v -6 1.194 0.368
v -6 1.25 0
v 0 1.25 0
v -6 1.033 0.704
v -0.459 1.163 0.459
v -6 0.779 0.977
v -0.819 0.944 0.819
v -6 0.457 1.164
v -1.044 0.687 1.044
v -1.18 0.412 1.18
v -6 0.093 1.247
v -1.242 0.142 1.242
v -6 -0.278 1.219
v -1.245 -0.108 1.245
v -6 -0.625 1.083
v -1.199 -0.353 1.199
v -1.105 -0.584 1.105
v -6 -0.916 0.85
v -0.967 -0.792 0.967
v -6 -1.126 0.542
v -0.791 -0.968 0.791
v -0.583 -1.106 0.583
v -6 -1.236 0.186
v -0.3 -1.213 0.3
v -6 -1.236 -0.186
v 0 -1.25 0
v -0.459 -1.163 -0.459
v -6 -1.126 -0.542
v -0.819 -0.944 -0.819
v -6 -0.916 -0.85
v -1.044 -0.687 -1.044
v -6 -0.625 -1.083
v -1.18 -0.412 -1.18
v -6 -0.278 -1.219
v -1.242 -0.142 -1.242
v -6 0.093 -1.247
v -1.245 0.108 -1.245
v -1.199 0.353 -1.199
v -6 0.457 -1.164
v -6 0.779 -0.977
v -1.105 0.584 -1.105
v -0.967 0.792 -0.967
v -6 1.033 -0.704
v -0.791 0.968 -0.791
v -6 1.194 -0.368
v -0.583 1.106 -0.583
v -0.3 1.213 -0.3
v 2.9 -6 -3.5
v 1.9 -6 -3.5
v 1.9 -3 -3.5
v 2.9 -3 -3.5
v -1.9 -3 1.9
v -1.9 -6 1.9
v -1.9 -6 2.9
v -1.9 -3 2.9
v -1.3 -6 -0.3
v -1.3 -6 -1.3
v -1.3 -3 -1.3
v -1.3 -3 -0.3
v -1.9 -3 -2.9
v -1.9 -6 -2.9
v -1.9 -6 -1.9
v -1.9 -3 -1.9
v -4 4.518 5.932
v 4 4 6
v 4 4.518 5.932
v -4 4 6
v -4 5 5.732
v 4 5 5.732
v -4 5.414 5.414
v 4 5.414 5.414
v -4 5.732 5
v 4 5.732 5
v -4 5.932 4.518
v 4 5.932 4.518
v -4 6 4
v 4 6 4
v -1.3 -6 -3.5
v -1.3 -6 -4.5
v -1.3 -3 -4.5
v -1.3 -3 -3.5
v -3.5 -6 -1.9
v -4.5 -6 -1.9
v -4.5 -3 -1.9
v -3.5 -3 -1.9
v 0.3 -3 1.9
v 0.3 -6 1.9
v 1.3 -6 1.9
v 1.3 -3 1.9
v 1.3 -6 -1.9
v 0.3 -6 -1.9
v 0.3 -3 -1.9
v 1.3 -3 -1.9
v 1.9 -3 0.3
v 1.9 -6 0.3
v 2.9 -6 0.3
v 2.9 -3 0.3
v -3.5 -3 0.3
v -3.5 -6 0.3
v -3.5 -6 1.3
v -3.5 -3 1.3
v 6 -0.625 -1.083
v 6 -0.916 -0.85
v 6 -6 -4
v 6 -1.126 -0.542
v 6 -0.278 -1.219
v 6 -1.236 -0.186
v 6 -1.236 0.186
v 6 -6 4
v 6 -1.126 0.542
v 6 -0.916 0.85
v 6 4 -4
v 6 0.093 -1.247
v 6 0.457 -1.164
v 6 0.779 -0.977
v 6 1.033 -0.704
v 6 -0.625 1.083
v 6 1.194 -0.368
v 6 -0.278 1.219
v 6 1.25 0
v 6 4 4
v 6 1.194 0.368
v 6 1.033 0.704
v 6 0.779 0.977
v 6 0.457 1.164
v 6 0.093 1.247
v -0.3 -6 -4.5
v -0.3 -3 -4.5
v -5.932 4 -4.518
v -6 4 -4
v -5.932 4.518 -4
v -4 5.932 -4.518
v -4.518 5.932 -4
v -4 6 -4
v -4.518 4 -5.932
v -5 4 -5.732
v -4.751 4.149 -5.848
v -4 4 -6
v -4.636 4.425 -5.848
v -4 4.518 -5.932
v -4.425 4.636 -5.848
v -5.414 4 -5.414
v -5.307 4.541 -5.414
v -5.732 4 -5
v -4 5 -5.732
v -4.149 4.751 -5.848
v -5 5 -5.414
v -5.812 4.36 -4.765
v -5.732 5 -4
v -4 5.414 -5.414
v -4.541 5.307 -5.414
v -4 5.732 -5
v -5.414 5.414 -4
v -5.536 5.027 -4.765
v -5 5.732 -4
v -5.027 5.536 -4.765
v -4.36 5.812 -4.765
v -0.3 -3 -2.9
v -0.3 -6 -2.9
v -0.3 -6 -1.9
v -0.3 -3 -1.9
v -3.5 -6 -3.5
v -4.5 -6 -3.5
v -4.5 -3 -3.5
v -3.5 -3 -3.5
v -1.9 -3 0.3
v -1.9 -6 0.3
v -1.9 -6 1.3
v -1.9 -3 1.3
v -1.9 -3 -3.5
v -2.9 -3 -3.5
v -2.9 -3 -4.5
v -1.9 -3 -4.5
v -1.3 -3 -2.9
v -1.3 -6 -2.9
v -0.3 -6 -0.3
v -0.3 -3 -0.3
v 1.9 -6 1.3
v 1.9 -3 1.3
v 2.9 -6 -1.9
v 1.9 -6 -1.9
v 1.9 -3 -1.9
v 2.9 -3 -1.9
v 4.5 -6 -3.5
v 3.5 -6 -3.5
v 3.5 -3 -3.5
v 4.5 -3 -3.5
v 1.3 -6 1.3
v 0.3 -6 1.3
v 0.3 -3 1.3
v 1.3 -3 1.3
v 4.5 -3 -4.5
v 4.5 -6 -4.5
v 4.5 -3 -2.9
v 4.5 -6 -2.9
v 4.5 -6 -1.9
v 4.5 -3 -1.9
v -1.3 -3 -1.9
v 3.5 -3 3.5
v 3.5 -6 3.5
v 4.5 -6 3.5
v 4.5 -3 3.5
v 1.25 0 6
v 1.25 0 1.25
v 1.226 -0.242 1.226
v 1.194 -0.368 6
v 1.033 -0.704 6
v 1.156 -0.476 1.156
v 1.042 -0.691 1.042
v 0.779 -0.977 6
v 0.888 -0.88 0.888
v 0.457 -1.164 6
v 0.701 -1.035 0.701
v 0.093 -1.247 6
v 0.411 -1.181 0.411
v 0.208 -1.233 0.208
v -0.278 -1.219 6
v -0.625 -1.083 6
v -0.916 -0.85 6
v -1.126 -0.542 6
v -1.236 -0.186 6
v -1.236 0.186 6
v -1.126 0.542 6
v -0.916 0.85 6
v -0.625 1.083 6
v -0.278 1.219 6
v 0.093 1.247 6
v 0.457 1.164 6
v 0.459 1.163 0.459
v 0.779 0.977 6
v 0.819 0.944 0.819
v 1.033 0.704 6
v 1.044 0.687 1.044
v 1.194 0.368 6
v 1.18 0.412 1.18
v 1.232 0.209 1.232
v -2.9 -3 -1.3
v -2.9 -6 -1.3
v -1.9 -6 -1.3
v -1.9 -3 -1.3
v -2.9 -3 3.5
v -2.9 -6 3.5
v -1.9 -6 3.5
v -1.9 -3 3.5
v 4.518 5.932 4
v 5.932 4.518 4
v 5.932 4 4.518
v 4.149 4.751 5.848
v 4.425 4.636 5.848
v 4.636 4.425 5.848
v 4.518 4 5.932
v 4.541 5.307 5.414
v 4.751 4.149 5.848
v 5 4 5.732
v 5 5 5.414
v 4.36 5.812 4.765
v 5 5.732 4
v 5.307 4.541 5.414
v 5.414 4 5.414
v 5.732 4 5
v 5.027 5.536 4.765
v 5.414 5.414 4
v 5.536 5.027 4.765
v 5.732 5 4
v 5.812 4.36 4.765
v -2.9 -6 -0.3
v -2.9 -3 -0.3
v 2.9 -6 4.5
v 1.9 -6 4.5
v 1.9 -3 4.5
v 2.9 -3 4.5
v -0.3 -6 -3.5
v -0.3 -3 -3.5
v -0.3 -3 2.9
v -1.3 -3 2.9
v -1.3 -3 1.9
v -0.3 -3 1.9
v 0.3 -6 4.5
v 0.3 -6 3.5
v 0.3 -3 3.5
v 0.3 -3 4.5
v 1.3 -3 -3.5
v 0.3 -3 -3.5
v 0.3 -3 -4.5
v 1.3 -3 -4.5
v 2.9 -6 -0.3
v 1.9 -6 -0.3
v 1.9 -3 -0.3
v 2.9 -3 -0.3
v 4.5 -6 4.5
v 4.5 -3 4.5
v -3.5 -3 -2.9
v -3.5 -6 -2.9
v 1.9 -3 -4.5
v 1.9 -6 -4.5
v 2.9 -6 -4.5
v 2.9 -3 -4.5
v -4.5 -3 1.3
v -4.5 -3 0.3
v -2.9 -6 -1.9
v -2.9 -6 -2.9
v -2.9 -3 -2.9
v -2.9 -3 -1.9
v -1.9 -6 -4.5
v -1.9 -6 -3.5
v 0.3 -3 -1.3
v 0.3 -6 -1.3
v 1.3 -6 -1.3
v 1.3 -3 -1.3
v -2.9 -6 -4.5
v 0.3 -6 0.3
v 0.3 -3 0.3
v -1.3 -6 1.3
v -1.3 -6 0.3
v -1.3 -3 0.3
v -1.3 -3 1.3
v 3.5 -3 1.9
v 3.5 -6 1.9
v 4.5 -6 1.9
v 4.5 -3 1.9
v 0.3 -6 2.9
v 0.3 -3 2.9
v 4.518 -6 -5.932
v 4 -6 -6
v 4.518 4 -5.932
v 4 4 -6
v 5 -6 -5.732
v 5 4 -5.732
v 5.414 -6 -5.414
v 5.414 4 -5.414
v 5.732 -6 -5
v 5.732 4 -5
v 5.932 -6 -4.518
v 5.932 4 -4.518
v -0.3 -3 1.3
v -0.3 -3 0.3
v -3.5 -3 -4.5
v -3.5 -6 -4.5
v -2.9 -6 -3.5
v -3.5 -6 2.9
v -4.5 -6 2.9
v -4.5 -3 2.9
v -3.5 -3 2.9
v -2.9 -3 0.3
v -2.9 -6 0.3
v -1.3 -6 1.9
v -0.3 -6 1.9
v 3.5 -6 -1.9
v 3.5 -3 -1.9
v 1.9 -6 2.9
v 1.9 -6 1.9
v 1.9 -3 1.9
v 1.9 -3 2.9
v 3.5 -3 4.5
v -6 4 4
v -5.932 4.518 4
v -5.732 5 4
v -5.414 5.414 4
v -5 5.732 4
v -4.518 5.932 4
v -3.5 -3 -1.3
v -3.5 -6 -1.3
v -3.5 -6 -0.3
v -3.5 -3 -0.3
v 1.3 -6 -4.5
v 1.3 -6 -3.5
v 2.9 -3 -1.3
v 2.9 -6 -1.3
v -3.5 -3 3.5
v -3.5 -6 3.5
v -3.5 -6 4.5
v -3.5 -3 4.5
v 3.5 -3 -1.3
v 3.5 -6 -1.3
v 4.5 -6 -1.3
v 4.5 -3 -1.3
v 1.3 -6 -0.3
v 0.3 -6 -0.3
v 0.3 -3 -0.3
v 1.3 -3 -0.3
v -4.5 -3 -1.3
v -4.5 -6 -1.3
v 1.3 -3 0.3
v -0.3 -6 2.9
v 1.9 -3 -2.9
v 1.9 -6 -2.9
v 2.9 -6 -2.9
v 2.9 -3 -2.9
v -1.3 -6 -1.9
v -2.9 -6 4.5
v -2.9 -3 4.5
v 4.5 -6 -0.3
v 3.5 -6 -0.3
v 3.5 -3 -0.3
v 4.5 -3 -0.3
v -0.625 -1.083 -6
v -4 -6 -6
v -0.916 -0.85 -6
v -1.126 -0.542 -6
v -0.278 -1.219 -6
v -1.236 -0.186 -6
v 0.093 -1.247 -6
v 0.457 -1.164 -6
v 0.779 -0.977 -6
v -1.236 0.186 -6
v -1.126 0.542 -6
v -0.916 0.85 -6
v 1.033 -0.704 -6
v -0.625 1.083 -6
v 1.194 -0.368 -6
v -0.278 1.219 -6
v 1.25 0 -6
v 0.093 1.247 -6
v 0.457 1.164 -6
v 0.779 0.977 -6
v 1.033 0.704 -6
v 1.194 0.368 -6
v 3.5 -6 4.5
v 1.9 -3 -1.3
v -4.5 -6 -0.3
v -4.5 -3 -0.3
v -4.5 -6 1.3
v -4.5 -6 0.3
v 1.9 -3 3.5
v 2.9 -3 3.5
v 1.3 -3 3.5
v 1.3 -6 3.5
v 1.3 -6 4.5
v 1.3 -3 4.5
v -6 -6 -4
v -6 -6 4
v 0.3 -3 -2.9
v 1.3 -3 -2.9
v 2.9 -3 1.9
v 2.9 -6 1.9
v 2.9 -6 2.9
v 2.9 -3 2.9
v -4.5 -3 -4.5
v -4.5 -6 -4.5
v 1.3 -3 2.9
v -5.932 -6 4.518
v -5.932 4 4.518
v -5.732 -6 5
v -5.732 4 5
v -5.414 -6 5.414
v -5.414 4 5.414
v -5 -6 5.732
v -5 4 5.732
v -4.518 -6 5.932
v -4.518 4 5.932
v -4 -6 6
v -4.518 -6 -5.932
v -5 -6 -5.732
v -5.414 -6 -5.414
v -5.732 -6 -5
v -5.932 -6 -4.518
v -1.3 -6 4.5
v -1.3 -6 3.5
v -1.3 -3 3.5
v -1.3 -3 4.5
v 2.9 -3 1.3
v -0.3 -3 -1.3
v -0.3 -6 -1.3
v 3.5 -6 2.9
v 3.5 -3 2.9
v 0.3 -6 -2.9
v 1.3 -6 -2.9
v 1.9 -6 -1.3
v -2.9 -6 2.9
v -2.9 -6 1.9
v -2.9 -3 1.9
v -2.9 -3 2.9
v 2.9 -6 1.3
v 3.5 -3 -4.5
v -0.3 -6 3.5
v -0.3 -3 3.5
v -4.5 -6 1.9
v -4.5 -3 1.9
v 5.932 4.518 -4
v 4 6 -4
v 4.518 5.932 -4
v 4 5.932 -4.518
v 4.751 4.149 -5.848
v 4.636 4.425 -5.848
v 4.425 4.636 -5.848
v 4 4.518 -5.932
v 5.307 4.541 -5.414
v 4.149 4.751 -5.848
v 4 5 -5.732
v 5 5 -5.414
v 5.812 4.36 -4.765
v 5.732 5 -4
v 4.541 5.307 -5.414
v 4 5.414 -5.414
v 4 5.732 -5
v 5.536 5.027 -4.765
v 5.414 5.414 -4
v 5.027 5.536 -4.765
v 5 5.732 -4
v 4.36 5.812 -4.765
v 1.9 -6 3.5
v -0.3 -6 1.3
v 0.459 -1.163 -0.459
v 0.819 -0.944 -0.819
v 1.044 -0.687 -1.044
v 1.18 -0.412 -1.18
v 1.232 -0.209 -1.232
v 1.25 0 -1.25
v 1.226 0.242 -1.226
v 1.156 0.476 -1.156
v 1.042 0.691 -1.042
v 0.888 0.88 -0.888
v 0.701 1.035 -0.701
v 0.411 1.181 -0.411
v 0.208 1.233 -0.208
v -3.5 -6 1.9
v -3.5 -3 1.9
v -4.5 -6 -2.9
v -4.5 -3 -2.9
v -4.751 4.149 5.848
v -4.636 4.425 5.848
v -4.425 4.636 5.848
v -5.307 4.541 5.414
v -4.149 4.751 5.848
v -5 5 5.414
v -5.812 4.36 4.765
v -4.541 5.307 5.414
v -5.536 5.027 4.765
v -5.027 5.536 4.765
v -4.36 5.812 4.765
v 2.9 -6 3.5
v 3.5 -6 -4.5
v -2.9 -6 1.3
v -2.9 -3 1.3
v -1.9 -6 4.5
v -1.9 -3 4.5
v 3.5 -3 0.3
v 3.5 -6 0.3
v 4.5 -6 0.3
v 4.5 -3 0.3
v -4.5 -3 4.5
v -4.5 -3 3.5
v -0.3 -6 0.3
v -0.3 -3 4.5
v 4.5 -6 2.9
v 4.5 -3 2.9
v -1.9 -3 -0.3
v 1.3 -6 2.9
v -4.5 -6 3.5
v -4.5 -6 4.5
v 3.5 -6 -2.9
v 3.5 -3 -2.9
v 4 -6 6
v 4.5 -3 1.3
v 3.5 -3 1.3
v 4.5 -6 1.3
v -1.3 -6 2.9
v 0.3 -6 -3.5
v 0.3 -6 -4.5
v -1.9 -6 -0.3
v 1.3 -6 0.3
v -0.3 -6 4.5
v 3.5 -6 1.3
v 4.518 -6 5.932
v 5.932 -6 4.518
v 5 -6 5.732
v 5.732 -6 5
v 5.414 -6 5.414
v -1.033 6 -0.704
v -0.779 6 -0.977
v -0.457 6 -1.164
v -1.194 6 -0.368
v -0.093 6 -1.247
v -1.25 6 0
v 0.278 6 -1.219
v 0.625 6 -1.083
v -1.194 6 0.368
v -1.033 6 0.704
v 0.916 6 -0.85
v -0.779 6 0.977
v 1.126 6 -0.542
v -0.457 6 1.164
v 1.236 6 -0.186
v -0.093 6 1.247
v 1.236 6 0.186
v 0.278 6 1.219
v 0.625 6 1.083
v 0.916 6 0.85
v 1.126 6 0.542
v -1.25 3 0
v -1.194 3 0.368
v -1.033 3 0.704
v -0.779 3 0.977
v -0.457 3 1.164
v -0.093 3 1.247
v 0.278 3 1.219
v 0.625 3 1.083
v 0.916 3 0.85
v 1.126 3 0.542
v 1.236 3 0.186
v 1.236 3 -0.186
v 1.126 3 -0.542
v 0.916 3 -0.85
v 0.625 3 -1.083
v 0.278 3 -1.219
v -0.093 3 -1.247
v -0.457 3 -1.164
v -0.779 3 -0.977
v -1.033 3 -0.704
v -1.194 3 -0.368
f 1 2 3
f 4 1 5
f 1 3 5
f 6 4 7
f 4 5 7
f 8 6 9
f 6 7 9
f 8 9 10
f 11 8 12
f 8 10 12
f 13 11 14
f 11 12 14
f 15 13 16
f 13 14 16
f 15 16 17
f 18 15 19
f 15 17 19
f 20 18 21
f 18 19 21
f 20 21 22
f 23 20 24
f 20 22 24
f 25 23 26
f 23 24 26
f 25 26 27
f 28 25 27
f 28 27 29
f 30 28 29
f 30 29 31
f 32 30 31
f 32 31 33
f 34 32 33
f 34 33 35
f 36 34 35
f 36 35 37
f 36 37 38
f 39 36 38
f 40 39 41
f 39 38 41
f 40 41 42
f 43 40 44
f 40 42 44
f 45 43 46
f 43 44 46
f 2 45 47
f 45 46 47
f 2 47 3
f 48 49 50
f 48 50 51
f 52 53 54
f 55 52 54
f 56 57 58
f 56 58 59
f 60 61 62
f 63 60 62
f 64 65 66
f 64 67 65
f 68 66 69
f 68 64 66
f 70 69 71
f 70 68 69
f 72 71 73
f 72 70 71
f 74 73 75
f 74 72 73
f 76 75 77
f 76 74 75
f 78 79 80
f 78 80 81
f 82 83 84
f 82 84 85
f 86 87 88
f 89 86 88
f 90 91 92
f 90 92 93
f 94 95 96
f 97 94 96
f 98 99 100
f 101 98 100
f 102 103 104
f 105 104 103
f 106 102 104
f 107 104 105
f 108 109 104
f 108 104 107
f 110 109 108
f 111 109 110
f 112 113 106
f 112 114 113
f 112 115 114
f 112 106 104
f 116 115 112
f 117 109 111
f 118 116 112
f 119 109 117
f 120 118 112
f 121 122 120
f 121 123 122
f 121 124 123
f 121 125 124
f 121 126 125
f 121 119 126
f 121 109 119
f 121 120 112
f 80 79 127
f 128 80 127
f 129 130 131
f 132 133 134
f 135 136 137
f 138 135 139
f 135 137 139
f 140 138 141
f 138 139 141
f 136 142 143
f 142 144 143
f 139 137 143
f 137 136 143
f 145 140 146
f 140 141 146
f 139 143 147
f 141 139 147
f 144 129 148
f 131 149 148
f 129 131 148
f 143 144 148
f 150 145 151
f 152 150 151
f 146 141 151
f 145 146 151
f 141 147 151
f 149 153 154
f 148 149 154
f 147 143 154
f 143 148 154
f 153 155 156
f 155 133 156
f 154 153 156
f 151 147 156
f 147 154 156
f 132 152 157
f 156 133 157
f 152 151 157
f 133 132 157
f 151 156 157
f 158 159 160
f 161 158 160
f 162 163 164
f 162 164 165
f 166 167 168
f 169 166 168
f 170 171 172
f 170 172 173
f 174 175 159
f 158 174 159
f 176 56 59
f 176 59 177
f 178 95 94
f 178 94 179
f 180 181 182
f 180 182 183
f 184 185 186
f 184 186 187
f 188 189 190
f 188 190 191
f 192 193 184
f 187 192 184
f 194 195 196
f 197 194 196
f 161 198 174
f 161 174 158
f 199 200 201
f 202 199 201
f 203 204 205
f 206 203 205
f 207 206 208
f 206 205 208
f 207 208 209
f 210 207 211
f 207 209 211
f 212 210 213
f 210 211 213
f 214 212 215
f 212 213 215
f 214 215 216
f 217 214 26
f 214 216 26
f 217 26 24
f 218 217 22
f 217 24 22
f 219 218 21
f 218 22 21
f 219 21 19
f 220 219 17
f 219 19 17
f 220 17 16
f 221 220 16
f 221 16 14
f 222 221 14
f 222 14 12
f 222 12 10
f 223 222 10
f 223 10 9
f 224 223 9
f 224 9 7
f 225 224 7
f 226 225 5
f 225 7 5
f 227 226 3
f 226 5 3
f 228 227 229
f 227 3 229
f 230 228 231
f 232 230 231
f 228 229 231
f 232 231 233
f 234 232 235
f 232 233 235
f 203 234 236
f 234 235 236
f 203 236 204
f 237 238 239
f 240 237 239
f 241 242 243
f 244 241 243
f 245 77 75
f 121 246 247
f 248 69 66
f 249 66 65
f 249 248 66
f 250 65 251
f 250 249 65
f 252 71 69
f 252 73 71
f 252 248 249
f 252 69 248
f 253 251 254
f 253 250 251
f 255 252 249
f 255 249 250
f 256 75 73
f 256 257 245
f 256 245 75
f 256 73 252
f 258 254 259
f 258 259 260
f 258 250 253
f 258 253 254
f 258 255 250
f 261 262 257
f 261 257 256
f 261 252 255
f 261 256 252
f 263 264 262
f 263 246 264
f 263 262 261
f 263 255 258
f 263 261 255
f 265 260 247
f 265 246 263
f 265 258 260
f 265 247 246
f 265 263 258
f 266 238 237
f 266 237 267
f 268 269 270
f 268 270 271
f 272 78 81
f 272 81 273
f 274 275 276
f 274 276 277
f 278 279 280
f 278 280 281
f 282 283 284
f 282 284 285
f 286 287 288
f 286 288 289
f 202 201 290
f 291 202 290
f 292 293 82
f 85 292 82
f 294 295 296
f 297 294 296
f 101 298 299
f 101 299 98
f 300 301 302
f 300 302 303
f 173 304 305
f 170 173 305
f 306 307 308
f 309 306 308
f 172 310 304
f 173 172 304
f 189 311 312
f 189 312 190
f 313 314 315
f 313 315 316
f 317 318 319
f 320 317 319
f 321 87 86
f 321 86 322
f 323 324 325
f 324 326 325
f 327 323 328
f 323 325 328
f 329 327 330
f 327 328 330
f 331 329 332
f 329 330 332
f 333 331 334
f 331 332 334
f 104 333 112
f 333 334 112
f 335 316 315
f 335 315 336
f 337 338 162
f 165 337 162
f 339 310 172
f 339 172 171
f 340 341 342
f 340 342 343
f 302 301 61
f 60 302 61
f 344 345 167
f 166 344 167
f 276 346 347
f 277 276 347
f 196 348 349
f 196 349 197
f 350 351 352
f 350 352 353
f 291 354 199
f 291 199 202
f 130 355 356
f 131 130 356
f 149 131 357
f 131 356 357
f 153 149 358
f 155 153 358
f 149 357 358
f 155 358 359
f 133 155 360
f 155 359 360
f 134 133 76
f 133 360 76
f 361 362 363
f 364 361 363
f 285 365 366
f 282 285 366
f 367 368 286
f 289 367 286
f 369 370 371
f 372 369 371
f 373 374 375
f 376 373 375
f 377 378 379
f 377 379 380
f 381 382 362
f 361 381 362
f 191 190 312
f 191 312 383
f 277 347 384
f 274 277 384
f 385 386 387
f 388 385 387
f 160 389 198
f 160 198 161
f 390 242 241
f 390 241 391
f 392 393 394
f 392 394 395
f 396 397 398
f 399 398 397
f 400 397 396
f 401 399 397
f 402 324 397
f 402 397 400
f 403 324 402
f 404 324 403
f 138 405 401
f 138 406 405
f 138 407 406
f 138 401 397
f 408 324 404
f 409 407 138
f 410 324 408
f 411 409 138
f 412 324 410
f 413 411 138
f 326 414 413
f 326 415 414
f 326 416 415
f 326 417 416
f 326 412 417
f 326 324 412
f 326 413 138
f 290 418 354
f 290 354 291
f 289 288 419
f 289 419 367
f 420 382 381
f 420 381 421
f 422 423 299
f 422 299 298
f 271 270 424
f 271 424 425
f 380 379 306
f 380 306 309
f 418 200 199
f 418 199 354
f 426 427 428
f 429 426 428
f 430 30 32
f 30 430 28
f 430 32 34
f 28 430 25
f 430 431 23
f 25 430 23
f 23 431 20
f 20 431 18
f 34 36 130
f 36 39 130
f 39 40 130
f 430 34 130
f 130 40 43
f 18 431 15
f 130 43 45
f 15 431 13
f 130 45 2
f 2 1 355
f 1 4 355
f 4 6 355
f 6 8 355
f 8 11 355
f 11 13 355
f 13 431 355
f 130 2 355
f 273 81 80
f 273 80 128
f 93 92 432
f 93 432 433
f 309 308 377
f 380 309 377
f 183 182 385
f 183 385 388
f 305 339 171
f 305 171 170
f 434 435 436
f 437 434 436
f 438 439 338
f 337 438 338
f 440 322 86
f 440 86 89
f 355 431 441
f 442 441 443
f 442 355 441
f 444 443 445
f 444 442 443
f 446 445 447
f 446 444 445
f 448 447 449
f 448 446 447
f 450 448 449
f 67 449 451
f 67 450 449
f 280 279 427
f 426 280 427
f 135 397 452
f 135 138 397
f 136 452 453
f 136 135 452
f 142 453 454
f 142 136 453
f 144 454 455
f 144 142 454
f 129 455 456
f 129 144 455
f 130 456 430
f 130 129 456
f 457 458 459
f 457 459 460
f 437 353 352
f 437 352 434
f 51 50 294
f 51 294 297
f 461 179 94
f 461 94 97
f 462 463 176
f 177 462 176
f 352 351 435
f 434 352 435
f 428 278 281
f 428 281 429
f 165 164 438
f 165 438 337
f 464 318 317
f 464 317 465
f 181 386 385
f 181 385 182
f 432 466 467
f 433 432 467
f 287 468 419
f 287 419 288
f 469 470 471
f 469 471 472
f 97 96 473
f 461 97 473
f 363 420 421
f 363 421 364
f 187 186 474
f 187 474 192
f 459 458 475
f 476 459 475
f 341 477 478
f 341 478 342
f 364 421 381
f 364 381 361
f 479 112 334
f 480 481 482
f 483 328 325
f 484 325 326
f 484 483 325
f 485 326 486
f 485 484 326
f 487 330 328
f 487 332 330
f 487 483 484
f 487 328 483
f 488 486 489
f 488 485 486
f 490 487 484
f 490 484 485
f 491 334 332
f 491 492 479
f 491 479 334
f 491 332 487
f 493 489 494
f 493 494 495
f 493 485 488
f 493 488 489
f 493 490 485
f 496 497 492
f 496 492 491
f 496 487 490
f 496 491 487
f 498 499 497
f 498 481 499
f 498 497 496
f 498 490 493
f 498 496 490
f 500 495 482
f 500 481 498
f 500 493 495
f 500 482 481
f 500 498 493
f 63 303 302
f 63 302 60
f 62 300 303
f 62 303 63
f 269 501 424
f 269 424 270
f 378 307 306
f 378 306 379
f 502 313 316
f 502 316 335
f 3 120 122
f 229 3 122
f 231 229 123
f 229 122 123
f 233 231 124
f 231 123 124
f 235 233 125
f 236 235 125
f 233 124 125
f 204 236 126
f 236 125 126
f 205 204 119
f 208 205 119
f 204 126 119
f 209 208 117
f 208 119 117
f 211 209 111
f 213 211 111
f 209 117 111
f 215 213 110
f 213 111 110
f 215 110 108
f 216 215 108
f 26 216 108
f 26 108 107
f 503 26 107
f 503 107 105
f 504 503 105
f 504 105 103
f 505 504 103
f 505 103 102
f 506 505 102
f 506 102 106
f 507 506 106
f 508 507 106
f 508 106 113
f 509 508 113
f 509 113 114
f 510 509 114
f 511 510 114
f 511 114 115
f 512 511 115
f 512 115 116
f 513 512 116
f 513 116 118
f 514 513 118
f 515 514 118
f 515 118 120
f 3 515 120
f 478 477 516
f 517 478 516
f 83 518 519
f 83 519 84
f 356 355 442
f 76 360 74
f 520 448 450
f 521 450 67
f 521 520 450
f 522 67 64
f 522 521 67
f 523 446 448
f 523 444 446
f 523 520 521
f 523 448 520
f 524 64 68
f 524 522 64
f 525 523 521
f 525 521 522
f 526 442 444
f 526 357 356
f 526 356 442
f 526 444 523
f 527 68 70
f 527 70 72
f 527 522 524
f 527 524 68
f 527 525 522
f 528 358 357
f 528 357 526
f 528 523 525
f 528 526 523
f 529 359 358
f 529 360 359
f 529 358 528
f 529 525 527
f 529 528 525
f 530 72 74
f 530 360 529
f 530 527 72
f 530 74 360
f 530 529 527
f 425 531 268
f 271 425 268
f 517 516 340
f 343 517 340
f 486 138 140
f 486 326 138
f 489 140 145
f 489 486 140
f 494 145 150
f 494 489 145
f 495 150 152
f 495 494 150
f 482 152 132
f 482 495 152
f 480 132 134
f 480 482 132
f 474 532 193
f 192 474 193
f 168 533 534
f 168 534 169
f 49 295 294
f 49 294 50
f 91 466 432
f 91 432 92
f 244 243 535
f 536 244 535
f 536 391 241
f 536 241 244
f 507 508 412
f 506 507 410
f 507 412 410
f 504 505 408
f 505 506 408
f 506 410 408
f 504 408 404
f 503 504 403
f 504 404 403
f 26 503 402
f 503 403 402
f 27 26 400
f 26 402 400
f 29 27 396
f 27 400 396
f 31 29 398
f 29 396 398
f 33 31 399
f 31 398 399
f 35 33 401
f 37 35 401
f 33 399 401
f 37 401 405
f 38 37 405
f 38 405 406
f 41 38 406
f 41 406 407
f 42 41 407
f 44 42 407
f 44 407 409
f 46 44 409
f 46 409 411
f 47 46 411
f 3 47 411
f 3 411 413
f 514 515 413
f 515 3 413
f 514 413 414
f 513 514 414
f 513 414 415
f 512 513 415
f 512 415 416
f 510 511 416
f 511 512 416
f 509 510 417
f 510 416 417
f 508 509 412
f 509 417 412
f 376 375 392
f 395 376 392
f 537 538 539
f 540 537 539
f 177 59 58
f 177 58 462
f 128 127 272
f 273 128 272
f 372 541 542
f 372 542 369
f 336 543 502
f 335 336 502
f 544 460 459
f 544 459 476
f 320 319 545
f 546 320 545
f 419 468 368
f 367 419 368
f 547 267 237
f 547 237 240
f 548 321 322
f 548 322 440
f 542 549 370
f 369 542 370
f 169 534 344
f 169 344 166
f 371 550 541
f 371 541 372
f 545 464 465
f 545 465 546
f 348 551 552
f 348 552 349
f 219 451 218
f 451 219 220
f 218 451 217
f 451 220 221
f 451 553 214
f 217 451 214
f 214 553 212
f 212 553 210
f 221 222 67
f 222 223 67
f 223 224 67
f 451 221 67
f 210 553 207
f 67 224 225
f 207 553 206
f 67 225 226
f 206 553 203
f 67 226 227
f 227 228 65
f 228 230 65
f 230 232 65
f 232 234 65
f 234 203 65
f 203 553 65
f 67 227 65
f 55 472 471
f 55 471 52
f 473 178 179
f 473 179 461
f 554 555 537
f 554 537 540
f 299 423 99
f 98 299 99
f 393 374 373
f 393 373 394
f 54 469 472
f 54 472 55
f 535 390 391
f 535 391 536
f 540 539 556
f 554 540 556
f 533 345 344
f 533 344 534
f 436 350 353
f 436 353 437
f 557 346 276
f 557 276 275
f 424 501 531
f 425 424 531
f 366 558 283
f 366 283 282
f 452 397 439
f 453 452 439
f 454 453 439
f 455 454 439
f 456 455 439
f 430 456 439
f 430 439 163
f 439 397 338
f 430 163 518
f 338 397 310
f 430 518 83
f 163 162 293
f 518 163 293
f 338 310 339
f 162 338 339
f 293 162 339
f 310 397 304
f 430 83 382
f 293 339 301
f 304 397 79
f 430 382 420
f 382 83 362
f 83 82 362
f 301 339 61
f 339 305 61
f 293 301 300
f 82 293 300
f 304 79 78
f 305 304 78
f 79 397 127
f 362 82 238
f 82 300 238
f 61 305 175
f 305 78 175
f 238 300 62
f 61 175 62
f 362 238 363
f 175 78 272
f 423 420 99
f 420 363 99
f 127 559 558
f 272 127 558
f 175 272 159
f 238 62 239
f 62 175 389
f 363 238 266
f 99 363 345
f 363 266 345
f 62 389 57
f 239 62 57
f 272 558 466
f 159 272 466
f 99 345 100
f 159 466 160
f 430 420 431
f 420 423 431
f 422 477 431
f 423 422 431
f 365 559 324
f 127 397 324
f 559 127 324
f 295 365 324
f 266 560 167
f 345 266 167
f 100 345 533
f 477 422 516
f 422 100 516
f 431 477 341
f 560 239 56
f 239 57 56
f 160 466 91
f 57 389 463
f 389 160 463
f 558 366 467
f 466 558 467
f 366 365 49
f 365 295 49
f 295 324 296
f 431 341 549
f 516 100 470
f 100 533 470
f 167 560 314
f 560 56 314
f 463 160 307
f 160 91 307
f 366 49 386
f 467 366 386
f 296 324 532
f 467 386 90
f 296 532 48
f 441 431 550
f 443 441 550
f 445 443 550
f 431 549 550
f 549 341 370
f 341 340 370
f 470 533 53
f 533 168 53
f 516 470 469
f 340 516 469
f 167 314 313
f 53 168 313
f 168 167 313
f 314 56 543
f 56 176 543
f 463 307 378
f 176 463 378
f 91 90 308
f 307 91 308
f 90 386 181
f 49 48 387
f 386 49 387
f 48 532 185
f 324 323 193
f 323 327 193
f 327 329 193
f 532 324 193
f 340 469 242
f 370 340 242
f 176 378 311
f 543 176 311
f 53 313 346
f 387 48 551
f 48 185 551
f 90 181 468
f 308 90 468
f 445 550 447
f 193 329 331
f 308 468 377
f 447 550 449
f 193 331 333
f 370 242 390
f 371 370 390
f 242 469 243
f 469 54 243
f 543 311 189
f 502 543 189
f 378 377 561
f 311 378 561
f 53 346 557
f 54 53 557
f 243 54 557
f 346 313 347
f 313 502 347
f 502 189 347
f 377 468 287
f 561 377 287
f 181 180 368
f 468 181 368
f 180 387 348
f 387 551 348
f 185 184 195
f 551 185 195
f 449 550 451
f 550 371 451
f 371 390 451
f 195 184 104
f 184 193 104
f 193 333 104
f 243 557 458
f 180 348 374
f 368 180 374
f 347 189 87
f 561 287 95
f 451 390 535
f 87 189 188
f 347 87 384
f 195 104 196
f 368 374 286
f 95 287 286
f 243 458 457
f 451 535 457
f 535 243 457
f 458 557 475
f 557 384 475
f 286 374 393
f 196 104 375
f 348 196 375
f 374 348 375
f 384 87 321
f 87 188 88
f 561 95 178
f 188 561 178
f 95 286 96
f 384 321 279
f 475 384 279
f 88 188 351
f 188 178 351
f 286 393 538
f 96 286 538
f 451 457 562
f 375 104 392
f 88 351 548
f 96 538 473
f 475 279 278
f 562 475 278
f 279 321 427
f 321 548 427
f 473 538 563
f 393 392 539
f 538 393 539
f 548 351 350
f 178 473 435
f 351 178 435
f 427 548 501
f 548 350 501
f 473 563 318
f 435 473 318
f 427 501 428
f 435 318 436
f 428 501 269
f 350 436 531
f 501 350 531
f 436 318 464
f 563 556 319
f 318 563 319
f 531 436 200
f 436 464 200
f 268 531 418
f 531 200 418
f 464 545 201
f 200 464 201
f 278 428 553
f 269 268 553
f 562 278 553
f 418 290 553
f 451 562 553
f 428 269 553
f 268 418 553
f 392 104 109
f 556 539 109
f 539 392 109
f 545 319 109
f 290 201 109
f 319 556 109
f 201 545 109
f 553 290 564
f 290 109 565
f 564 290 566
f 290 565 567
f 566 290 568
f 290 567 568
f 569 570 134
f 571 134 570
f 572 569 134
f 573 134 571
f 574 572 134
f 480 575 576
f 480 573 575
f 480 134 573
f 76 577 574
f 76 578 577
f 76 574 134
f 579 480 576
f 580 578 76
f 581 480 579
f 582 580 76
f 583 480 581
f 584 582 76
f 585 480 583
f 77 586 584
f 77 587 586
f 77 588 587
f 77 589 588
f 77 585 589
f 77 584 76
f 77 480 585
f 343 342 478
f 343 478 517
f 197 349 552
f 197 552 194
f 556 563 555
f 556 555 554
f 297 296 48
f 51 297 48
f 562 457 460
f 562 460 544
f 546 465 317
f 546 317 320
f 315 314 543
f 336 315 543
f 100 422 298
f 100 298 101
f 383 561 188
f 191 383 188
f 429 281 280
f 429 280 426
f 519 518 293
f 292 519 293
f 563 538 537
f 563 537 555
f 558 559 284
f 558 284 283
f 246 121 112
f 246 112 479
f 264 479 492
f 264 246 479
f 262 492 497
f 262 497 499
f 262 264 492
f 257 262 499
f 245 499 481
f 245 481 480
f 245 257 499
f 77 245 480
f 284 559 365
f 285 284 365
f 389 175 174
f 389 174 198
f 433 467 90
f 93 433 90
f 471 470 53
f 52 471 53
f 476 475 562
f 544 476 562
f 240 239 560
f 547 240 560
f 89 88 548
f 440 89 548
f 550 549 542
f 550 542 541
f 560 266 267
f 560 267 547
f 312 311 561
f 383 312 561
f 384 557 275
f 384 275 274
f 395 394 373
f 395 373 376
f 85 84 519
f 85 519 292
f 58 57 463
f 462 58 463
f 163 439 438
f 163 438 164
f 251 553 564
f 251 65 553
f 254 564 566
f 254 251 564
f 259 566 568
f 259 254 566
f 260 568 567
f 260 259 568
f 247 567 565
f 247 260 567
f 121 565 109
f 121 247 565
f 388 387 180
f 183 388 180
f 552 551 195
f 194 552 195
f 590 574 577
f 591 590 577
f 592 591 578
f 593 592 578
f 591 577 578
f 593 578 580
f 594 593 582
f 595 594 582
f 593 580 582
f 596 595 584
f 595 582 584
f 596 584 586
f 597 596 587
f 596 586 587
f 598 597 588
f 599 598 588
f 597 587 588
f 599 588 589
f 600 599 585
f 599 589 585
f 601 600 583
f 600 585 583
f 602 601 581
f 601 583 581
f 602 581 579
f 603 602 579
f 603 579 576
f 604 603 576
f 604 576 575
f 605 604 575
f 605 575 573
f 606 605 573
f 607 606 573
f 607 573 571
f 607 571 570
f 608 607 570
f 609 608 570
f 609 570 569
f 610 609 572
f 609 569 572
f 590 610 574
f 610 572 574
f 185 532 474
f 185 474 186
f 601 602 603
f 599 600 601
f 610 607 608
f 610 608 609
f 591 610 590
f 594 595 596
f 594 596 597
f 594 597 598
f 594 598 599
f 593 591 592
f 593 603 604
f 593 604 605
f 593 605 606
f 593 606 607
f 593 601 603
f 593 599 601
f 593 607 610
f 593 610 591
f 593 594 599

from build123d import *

# Parameters (mm, degrees)
F0_W      = 12
F0_H      = 12
F1_DEPTH  = 6
F2_R      = 1.25
F3_DEPTH  = 12.001
F4_R      = 1.25
F5_DEPTH  = 3
F6_R      = 1.25
F7_DEPTH  = 25
F8_R      = 2
F9_W      = 1
F9_H      = 1
F10_DEPTH = 3


with BuildPart() as f1:
    # F0 (on Right) → F1 (new body, symmetric)
    with BuildSketch(Plane.YZ):
        Rectangle(F0_W, F0_H)
    extrude(amount=F1_DEPTH, both=True)

    # F2 (on face) → F3 (cut, through all)
    with BuildSketch(Plane.YZ.offset(6)):
        Circle(F2_R)
    extrude(amount=-F3_DEPTH, mode=Mode.SUBTRACT)

    # F4 (on face) → F5 (cut)
    with BuildSketch(Plane(origin=(0, 6, 0), x_dir=(-1, 0, 0), z_dir=(0, 1, 0))):
        Circle(F4_R)
    extrude(amount=-F5_DEPTH, mode=Mode.SUBTRACT)

    # F6 (on face) → F7 (cut)
    with BuildSketch(Plane(origin=(0, 0, -6), x_dir=(1, 0, 0), z_dir=(0, 0, -1))):
        Circle(F6_R)
    extrude(amount=-F7_DEPTH, mode=Mode.SUBTRACT)

    # F8
    f8_edges = [f1.edges().sort_by_distance(p)[0] for p in [
        (6, 6, 0),
        (-6, 6, 0),
        (-6, 0, -6),
        (6, 0, -6),
        (0, 6, -6),
        (-6, 0, 6),
        (0, 6, 6),
        (6, 0, 6),
    ]]
    fillet(f8_edges, radius=F8_R)

    # F9 (on face) → F10 (cut)
    with BuildSketch(Plane.XZ.offset(6)):
        with Locations((-4, 4)):
            Rectangle(F9_W, F9_H)
        with Locations((-4, 2.4)):
            Rectangle(F9_W, F9_H)
        with Locations((-4, 0.8)):
            Rectangle(F9_W, F9_H)
        with Locations((-4, -0.8)):
            Rectangle(F9_W, F9_H)
        with Locations((-4, -2.4)):
            Rectangle(F9_W, F9_H)
        with Locations((-4, -4)):
            Rectangle(F9_W, F9_H)
        with Locations((-2.4, 4)):
            Rectangle(F9_W, F9_H)
        with Locations((-2.4, 2.4)):
            Rectangle(F9_W, F9_H)
        with Locations((-2.4, 0.8)):
            Rectangle(F9_W, F9_H)
        with Locations((-2.4, -0.8)):
            Rectangle(F9_W, F9_H)
        with Locations((-2.4, -2.4)):
            Rectangle(F9_W, F9_H)
        with Locations((-2.4, -4)):
            Rectangle(F9_W, F9_H)
        with Locations((-0.8, 4)):
            Rectangle(F9_W, F9_H)
        with Locations((-0.8, 2.4)):
            Rectangle(F9_W, F9_H)
        with Locations((-0.8, 0.8)):
            Rectangle(F9_W, F9_H)
        with Locations((-0.8, -0.8)):
            Rectangle(F9_W, F9_H)
        with Locations((-0.8, -2.4)):
            Rectangle(F9_W, F9_H)
        with Locations((-0.8, -4)):
            Rectangle(F9_W, F9_H)
        with Locations((0.8, 4)):
            Rectangle(F9_W, F9_H)
        with Locations((0.8, 2.4)):
            Rectangle(F9_W, F9_H)
        with Locations((0.8, 0.8)):
            Rectangle(F9_W, F9_H)
        with Locations((0.8, -0.8)):
            Rectangle(F9_W, F9_H)
        with Locations((0.8, -2.4)):
            Rectangle(F9_W, F9_H)
        with Locations((0.8, -4)):
            Rectangle(F9_W, F9_H)
        with Locations((2.4, 4)):
            Rectangle(F9_W, F9_H)
        with Locations((2.4, 2.4)):
            Rectangle(F9_W, F9_H)
        with Locations((2.4, 0.8)):
            Rectangle(F9_W, F9_H)
        with Locations((2.4, -0.8)):
            Rectangle(F9_W, F9_H)
        with Locations((2.4, -2.4)):
            Rectangle(F9_W, F9_H)
        with Locations((2.4, -4)):
            Rectangle(F9_W, F9_H)
        with Locations((4, 4)):
            Rectangle(F9_W, F9_H)
        with Locations((4, 2.4)):
            Rectangle(F9_W, F9_H)
        with Locations((4, 0.8)):
            Rectangle(F9_W, F9_H)
        with Locations((4, -0.8)):
            Rectangle(F9_W, F9_H)
        with Locations((4, -2.4)):
            Rectangle(F9_W, F9_H)
        with Locations((4, -4)):
            Rectangle(F9_W, F9_H)
    extrude(amount=-F10_DEPTH, mode=Mode.SUBTRACT)


solid = f1.part
